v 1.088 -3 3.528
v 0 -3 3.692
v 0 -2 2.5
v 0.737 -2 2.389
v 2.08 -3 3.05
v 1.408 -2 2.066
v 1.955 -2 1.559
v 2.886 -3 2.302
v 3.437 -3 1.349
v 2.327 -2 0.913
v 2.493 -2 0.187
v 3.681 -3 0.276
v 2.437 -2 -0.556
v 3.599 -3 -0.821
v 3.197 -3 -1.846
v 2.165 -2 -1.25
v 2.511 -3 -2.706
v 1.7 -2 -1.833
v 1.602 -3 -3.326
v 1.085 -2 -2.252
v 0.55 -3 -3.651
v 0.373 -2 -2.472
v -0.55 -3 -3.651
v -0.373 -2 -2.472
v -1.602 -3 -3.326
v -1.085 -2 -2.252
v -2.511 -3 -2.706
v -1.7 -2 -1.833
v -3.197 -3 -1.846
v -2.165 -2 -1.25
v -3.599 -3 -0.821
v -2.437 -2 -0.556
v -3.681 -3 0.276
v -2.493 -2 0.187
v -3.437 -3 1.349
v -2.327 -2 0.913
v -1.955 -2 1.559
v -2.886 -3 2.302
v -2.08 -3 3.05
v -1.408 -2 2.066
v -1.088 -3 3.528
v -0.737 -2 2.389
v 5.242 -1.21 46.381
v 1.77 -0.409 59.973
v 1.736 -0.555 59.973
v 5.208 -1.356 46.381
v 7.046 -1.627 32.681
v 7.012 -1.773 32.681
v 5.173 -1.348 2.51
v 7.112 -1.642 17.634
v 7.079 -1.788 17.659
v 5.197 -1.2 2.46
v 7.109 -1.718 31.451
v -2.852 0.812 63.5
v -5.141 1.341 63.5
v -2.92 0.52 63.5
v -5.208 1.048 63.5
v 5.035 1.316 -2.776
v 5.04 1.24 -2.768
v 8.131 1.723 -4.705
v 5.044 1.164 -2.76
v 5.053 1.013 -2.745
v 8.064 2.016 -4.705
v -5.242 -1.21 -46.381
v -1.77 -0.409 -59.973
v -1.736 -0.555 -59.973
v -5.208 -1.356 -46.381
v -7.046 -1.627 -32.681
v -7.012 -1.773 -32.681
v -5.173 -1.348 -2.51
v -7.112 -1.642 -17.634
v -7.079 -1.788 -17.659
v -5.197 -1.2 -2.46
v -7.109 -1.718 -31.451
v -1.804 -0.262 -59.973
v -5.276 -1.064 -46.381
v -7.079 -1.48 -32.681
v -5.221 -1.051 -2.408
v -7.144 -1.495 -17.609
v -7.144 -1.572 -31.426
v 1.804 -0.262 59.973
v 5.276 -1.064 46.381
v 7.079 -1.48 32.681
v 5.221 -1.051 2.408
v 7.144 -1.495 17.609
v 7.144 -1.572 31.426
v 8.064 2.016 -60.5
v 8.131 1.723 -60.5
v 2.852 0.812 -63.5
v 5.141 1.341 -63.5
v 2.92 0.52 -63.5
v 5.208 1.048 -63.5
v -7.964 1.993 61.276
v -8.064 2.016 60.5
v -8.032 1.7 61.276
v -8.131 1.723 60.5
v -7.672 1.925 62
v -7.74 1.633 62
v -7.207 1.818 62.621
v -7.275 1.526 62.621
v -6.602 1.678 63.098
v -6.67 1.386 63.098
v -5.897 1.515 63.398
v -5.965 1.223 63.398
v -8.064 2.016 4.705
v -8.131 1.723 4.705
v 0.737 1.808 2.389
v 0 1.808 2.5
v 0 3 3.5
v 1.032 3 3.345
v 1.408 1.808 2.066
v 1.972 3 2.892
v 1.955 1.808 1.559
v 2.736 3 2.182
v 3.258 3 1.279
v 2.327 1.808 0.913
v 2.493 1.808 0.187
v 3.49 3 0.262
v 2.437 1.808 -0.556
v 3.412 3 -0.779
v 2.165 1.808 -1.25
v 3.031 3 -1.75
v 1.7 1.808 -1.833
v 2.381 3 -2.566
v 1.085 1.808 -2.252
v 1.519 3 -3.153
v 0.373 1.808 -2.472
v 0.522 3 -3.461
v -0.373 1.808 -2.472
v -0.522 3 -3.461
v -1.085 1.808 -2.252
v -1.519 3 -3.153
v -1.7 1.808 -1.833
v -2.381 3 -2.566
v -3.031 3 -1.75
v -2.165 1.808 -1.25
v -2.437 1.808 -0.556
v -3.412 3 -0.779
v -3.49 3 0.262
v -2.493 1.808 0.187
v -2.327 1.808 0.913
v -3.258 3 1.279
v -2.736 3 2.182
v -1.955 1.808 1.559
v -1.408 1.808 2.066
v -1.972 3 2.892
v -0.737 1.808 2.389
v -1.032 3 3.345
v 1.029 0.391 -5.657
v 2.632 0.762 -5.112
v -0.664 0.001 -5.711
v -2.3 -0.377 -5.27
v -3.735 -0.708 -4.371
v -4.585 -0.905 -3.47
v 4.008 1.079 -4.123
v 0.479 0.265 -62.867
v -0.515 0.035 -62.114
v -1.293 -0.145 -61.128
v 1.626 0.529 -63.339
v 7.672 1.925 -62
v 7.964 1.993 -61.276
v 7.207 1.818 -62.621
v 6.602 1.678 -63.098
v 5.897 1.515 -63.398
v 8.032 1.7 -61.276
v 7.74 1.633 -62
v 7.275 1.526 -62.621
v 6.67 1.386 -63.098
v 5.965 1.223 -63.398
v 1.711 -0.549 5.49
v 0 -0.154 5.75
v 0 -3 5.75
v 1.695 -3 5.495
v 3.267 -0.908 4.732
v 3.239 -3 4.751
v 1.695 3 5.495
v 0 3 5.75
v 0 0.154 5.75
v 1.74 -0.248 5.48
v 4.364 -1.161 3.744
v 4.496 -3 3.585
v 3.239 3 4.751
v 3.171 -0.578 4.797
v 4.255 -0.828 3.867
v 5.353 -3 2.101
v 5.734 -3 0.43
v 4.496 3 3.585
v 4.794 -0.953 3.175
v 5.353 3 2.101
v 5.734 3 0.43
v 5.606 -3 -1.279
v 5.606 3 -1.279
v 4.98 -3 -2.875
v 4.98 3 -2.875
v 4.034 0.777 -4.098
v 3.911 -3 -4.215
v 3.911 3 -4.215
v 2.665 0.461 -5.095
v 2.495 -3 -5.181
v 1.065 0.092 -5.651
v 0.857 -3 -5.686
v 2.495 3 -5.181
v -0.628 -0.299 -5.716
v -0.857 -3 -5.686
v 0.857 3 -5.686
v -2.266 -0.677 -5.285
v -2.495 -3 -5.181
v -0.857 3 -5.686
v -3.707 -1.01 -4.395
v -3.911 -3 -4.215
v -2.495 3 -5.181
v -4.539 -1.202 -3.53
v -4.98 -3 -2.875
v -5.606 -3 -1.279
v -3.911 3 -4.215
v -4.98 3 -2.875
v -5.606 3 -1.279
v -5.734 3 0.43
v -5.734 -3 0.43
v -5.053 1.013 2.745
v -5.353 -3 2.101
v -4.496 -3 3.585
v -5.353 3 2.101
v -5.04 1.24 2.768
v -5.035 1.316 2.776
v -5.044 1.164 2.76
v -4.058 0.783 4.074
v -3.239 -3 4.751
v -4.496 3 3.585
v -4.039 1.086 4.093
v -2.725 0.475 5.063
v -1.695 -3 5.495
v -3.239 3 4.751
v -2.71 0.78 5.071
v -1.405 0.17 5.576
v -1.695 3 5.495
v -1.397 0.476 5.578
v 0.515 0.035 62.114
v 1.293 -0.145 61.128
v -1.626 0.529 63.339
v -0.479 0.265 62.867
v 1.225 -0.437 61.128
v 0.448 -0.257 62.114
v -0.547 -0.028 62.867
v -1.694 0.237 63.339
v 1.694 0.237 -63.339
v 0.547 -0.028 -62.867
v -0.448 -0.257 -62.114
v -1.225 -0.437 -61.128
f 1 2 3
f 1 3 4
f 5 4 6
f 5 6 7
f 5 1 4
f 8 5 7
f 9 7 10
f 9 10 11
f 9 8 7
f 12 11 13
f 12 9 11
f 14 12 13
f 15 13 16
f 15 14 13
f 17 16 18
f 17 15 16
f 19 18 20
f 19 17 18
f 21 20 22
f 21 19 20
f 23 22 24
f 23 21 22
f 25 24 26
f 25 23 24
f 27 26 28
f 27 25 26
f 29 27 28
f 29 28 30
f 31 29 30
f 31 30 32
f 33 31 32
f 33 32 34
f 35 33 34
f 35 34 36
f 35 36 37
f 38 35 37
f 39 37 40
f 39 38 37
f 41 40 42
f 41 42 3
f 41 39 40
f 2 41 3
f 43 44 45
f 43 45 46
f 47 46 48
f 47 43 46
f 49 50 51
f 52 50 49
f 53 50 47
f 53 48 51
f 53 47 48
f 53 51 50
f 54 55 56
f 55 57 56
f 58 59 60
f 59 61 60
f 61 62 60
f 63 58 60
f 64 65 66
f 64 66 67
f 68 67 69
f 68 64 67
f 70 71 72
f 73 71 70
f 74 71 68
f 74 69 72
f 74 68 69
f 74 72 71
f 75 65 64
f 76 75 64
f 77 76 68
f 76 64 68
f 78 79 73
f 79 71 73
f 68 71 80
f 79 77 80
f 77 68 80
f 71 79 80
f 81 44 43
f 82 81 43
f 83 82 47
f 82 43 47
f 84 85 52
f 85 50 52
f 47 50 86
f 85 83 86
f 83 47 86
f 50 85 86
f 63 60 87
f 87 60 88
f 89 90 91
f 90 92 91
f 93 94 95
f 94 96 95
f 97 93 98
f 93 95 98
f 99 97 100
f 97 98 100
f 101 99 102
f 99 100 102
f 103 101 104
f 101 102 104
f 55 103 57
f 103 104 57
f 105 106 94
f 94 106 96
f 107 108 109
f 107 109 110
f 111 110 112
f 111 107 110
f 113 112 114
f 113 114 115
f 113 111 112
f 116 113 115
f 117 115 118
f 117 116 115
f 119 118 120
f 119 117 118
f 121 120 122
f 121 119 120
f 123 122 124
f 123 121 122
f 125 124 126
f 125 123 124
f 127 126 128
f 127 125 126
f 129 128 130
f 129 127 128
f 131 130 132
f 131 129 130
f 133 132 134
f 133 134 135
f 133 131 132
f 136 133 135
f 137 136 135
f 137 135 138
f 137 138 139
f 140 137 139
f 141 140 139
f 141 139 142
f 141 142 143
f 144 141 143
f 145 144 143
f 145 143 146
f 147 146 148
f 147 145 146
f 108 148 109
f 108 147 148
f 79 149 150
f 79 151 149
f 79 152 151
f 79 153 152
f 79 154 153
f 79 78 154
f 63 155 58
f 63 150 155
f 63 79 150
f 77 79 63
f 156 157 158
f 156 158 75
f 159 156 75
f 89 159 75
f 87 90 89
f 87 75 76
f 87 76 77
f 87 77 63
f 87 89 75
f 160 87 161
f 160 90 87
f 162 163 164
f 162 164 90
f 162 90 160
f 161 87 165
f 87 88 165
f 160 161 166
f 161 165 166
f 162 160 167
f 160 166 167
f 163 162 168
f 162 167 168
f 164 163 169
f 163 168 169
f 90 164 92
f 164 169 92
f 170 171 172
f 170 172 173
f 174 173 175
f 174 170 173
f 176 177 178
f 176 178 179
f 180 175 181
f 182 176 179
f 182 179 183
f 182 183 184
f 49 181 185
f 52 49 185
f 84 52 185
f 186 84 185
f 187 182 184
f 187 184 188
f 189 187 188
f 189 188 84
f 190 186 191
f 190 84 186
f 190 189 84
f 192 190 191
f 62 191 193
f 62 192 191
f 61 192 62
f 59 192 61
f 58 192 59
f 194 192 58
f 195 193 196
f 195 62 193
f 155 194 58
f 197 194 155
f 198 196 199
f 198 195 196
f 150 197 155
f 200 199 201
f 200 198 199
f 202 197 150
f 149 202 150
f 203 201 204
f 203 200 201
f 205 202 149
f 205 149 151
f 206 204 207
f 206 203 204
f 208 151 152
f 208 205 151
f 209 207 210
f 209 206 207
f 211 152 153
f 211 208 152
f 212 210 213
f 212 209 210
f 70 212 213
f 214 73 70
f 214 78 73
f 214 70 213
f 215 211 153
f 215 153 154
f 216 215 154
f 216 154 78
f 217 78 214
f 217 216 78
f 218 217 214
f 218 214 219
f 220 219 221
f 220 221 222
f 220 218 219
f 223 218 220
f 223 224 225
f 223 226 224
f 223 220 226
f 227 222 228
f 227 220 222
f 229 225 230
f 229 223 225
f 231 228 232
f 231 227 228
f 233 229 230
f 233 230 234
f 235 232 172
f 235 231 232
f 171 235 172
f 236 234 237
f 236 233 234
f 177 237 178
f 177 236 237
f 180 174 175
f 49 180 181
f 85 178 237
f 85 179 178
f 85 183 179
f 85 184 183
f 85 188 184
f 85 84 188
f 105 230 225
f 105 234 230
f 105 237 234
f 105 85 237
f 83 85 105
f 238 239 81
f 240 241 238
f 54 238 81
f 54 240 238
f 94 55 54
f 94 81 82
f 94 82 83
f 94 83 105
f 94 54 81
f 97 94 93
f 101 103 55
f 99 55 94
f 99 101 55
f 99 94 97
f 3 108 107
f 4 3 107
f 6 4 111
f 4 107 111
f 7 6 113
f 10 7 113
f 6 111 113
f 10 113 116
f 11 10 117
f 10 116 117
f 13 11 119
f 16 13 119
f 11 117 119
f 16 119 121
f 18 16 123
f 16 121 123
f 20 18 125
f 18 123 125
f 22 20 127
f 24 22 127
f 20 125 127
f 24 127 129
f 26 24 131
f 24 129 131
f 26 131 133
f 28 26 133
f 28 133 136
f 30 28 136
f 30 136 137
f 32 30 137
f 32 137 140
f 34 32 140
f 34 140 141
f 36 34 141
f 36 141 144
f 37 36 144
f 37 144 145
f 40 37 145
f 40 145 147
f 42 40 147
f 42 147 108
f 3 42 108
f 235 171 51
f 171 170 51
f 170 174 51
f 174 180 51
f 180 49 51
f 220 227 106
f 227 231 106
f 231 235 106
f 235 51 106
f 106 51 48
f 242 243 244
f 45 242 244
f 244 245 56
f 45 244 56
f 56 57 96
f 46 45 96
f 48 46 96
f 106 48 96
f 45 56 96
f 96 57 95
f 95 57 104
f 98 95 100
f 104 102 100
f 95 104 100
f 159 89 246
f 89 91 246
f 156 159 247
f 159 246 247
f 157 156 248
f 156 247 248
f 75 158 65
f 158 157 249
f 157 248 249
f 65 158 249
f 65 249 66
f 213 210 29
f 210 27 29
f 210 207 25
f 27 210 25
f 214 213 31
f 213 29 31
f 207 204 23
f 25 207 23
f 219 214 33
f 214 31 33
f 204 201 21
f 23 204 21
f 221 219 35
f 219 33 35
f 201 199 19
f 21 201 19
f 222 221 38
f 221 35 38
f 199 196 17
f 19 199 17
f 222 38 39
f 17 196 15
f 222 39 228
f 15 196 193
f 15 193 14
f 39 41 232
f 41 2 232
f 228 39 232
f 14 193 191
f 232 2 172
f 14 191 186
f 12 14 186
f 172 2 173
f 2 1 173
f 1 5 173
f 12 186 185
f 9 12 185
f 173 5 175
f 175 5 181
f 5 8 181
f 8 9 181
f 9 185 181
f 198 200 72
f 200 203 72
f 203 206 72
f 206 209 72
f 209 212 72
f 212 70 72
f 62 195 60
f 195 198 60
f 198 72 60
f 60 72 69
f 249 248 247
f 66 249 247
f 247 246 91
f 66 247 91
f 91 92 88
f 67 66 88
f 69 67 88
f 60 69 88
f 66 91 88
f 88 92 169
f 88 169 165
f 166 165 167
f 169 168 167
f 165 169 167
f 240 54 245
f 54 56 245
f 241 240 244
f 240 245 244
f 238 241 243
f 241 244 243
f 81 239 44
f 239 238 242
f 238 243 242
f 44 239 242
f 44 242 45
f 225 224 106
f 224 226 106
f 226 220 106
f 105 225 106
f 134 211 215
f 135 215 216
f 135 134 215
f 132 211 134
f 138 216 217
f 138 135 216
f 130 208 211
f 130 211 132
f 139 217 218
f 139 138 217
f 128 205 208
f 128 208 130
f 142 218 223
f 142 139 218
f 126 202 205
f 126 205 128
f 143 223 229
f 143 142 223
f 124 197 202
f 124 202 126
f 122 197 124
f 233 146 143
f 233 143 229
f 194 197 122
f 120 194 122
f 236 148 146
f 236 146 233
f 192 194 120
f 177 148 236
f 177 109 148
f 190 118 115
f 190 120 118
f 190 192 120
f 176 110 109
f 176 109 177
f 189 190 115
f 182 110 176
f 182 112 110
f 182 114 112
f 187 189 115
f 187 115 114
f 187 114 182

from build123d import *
from OCP.BRepFilletAPI import BRepFilletAPI_MakeChamfer

# Parameters (mm, degrees)
SKETCH1_R           = 5.75
BOSS_EXTRUDE1_DEPTH = 3
BOSS_EXTRUDE2_DEPTH = 0.15
CIRPATTERN1_COUNT   = 2
SKETCH4_R           = 2.5
CUT_EXTRUDE1_DEPTH  = 65.299031318
CHAMFER1_SIZE       = 1
CHAMFER1_SIZE2      = 1.191753593


with BuildPart() as part:
    # Sketch1 → Boss-Extrude1 (new, symmetric)
    with BuildSketch(Plane(origin=(0, 0, 0), x_dir=(1, 0, 0), z_dir=(0, 1, 0))):
        with Locations(Location((0, 0, 0), (0, 0, 270))):
            Circle(SKETCH1_R)
    extrude(amount=BOSS_EXTRUDE1_DEPTH, both=True)

    # Sketch3 → Boss-Extrude2 (add, symmetric)
    with BuildSketch(Plane(origin=(0, 0, 0), x_dir=(0.9743700647852351, -0.22495105434386548, 0), z_dir=(-0.2249510543438655, -0.9743700647852352, 0))):
        with BuildLine():
            Line((-4.454728917, 2.312449404), (-8.310390593, 4.705233436))
            Line((-8.310390593, 4.705233436), (-8.310390593, 60.5))
            ThreePointArc((-8.310390593, 60.5), (-7.431710937, 62.621320344), (-5.310390593, 63.5))
            Line((-5.310390593, 63.5), (-2.961672938, 63.5))
            ThreePointArc((-2.961672938, 63.5), (0.007877818, 62.522656871), (1.816520564, 59.972707322))
            add(Edge.make_bspline(
                [(1.816520564, 59.972707322), (11.305446488, 30.906067871), (5.007624384, 0.848133108)],
                knots=[0, 0, 0, 1, 1, 1], degree=2))
            add(Edge.make_bspline(
                [(-4.454728917, 2.312449404), (0.194469727, 8.941584866), (5.007624384, 0.848133108)],
                knots=[0, 0, 0, 1, 1, 1], degree=2))
        make_face()
    boss_extrude2 = extrude(amount=BOSS_EXTRUDE2_DEPTH, both=True)

    # CirPattern1: Boss-Extrude2 ×2 about axis
    cirpattern1_axis = Axis((0, -3, 0), (0, 1, 0))
    for i in range(1, CIRPATTERN1_COUNT):
        add(boss_extrude2.rotate(cirpattern1_axis, i * 360 / CIRPATTERN1_COUNT))

    # Sketch4 → Cut-Extrude1 (cut, through all)
    with BuildSketch(Plane(origin=(0, 3, 0), x_dir=(1, 0, 0), z_dir=(0, 1, 0))):
        with Locations(Location((0, 0, 0), (0, 0, 270))):
            Circle(SKETCH4_R)
    extrude(amount=-CUT_EXTRUDE1_DEPTH, mode=Mode.SUBTRACT)

    # Chamfer1: one chamfer whose edges measure the first distance from different faces: ONE call of the kernel's chamfer builder (chamfer() names one face for all edges)
    chamfer1_edges_1 = [part.edges().sort_by_distance(p)[0] for p in [
        (0, -3, -2.5),
    ]]
    chamfer1_side_1 = [part.faces().sort_by_distance(p)[0] for p in [
        (0, 0, -2.5),
    ]]
    chamfer1_edges_2 = [part.edges().sort_by_distance(p)[0] for p in [
        (0, 3, -2.5),
    ]]
    chamfer1_side_2 = [part.faces().sort_by_distance(p)[0] for p in [
        (0, 3, -5.58736544),
    ]]
    chamfer1 = BRepFilletAPI_MakeChamfer(part.part.solid().wrapped)
    for e in chamfer1_edges_1:
        chamfer1.Add(CHAMFER1_SIZE, CHAMFER1_SIZE2, e.wrapped, chamfer1_side_1[0].wrapped)  # the first distance lies on this face
    for e in chamfer1_edges_2:
        chamfer1.Add(CHAMFER1_SIZE, CHAMFER1_SIZE2, e.wrapped, chamfer1_side_2[0].wrapped)  # the first distance lies on this face
    add(Compound.cast(chamfer1.Shape()), mode=Mode.REPLACE)


solid = part.part
